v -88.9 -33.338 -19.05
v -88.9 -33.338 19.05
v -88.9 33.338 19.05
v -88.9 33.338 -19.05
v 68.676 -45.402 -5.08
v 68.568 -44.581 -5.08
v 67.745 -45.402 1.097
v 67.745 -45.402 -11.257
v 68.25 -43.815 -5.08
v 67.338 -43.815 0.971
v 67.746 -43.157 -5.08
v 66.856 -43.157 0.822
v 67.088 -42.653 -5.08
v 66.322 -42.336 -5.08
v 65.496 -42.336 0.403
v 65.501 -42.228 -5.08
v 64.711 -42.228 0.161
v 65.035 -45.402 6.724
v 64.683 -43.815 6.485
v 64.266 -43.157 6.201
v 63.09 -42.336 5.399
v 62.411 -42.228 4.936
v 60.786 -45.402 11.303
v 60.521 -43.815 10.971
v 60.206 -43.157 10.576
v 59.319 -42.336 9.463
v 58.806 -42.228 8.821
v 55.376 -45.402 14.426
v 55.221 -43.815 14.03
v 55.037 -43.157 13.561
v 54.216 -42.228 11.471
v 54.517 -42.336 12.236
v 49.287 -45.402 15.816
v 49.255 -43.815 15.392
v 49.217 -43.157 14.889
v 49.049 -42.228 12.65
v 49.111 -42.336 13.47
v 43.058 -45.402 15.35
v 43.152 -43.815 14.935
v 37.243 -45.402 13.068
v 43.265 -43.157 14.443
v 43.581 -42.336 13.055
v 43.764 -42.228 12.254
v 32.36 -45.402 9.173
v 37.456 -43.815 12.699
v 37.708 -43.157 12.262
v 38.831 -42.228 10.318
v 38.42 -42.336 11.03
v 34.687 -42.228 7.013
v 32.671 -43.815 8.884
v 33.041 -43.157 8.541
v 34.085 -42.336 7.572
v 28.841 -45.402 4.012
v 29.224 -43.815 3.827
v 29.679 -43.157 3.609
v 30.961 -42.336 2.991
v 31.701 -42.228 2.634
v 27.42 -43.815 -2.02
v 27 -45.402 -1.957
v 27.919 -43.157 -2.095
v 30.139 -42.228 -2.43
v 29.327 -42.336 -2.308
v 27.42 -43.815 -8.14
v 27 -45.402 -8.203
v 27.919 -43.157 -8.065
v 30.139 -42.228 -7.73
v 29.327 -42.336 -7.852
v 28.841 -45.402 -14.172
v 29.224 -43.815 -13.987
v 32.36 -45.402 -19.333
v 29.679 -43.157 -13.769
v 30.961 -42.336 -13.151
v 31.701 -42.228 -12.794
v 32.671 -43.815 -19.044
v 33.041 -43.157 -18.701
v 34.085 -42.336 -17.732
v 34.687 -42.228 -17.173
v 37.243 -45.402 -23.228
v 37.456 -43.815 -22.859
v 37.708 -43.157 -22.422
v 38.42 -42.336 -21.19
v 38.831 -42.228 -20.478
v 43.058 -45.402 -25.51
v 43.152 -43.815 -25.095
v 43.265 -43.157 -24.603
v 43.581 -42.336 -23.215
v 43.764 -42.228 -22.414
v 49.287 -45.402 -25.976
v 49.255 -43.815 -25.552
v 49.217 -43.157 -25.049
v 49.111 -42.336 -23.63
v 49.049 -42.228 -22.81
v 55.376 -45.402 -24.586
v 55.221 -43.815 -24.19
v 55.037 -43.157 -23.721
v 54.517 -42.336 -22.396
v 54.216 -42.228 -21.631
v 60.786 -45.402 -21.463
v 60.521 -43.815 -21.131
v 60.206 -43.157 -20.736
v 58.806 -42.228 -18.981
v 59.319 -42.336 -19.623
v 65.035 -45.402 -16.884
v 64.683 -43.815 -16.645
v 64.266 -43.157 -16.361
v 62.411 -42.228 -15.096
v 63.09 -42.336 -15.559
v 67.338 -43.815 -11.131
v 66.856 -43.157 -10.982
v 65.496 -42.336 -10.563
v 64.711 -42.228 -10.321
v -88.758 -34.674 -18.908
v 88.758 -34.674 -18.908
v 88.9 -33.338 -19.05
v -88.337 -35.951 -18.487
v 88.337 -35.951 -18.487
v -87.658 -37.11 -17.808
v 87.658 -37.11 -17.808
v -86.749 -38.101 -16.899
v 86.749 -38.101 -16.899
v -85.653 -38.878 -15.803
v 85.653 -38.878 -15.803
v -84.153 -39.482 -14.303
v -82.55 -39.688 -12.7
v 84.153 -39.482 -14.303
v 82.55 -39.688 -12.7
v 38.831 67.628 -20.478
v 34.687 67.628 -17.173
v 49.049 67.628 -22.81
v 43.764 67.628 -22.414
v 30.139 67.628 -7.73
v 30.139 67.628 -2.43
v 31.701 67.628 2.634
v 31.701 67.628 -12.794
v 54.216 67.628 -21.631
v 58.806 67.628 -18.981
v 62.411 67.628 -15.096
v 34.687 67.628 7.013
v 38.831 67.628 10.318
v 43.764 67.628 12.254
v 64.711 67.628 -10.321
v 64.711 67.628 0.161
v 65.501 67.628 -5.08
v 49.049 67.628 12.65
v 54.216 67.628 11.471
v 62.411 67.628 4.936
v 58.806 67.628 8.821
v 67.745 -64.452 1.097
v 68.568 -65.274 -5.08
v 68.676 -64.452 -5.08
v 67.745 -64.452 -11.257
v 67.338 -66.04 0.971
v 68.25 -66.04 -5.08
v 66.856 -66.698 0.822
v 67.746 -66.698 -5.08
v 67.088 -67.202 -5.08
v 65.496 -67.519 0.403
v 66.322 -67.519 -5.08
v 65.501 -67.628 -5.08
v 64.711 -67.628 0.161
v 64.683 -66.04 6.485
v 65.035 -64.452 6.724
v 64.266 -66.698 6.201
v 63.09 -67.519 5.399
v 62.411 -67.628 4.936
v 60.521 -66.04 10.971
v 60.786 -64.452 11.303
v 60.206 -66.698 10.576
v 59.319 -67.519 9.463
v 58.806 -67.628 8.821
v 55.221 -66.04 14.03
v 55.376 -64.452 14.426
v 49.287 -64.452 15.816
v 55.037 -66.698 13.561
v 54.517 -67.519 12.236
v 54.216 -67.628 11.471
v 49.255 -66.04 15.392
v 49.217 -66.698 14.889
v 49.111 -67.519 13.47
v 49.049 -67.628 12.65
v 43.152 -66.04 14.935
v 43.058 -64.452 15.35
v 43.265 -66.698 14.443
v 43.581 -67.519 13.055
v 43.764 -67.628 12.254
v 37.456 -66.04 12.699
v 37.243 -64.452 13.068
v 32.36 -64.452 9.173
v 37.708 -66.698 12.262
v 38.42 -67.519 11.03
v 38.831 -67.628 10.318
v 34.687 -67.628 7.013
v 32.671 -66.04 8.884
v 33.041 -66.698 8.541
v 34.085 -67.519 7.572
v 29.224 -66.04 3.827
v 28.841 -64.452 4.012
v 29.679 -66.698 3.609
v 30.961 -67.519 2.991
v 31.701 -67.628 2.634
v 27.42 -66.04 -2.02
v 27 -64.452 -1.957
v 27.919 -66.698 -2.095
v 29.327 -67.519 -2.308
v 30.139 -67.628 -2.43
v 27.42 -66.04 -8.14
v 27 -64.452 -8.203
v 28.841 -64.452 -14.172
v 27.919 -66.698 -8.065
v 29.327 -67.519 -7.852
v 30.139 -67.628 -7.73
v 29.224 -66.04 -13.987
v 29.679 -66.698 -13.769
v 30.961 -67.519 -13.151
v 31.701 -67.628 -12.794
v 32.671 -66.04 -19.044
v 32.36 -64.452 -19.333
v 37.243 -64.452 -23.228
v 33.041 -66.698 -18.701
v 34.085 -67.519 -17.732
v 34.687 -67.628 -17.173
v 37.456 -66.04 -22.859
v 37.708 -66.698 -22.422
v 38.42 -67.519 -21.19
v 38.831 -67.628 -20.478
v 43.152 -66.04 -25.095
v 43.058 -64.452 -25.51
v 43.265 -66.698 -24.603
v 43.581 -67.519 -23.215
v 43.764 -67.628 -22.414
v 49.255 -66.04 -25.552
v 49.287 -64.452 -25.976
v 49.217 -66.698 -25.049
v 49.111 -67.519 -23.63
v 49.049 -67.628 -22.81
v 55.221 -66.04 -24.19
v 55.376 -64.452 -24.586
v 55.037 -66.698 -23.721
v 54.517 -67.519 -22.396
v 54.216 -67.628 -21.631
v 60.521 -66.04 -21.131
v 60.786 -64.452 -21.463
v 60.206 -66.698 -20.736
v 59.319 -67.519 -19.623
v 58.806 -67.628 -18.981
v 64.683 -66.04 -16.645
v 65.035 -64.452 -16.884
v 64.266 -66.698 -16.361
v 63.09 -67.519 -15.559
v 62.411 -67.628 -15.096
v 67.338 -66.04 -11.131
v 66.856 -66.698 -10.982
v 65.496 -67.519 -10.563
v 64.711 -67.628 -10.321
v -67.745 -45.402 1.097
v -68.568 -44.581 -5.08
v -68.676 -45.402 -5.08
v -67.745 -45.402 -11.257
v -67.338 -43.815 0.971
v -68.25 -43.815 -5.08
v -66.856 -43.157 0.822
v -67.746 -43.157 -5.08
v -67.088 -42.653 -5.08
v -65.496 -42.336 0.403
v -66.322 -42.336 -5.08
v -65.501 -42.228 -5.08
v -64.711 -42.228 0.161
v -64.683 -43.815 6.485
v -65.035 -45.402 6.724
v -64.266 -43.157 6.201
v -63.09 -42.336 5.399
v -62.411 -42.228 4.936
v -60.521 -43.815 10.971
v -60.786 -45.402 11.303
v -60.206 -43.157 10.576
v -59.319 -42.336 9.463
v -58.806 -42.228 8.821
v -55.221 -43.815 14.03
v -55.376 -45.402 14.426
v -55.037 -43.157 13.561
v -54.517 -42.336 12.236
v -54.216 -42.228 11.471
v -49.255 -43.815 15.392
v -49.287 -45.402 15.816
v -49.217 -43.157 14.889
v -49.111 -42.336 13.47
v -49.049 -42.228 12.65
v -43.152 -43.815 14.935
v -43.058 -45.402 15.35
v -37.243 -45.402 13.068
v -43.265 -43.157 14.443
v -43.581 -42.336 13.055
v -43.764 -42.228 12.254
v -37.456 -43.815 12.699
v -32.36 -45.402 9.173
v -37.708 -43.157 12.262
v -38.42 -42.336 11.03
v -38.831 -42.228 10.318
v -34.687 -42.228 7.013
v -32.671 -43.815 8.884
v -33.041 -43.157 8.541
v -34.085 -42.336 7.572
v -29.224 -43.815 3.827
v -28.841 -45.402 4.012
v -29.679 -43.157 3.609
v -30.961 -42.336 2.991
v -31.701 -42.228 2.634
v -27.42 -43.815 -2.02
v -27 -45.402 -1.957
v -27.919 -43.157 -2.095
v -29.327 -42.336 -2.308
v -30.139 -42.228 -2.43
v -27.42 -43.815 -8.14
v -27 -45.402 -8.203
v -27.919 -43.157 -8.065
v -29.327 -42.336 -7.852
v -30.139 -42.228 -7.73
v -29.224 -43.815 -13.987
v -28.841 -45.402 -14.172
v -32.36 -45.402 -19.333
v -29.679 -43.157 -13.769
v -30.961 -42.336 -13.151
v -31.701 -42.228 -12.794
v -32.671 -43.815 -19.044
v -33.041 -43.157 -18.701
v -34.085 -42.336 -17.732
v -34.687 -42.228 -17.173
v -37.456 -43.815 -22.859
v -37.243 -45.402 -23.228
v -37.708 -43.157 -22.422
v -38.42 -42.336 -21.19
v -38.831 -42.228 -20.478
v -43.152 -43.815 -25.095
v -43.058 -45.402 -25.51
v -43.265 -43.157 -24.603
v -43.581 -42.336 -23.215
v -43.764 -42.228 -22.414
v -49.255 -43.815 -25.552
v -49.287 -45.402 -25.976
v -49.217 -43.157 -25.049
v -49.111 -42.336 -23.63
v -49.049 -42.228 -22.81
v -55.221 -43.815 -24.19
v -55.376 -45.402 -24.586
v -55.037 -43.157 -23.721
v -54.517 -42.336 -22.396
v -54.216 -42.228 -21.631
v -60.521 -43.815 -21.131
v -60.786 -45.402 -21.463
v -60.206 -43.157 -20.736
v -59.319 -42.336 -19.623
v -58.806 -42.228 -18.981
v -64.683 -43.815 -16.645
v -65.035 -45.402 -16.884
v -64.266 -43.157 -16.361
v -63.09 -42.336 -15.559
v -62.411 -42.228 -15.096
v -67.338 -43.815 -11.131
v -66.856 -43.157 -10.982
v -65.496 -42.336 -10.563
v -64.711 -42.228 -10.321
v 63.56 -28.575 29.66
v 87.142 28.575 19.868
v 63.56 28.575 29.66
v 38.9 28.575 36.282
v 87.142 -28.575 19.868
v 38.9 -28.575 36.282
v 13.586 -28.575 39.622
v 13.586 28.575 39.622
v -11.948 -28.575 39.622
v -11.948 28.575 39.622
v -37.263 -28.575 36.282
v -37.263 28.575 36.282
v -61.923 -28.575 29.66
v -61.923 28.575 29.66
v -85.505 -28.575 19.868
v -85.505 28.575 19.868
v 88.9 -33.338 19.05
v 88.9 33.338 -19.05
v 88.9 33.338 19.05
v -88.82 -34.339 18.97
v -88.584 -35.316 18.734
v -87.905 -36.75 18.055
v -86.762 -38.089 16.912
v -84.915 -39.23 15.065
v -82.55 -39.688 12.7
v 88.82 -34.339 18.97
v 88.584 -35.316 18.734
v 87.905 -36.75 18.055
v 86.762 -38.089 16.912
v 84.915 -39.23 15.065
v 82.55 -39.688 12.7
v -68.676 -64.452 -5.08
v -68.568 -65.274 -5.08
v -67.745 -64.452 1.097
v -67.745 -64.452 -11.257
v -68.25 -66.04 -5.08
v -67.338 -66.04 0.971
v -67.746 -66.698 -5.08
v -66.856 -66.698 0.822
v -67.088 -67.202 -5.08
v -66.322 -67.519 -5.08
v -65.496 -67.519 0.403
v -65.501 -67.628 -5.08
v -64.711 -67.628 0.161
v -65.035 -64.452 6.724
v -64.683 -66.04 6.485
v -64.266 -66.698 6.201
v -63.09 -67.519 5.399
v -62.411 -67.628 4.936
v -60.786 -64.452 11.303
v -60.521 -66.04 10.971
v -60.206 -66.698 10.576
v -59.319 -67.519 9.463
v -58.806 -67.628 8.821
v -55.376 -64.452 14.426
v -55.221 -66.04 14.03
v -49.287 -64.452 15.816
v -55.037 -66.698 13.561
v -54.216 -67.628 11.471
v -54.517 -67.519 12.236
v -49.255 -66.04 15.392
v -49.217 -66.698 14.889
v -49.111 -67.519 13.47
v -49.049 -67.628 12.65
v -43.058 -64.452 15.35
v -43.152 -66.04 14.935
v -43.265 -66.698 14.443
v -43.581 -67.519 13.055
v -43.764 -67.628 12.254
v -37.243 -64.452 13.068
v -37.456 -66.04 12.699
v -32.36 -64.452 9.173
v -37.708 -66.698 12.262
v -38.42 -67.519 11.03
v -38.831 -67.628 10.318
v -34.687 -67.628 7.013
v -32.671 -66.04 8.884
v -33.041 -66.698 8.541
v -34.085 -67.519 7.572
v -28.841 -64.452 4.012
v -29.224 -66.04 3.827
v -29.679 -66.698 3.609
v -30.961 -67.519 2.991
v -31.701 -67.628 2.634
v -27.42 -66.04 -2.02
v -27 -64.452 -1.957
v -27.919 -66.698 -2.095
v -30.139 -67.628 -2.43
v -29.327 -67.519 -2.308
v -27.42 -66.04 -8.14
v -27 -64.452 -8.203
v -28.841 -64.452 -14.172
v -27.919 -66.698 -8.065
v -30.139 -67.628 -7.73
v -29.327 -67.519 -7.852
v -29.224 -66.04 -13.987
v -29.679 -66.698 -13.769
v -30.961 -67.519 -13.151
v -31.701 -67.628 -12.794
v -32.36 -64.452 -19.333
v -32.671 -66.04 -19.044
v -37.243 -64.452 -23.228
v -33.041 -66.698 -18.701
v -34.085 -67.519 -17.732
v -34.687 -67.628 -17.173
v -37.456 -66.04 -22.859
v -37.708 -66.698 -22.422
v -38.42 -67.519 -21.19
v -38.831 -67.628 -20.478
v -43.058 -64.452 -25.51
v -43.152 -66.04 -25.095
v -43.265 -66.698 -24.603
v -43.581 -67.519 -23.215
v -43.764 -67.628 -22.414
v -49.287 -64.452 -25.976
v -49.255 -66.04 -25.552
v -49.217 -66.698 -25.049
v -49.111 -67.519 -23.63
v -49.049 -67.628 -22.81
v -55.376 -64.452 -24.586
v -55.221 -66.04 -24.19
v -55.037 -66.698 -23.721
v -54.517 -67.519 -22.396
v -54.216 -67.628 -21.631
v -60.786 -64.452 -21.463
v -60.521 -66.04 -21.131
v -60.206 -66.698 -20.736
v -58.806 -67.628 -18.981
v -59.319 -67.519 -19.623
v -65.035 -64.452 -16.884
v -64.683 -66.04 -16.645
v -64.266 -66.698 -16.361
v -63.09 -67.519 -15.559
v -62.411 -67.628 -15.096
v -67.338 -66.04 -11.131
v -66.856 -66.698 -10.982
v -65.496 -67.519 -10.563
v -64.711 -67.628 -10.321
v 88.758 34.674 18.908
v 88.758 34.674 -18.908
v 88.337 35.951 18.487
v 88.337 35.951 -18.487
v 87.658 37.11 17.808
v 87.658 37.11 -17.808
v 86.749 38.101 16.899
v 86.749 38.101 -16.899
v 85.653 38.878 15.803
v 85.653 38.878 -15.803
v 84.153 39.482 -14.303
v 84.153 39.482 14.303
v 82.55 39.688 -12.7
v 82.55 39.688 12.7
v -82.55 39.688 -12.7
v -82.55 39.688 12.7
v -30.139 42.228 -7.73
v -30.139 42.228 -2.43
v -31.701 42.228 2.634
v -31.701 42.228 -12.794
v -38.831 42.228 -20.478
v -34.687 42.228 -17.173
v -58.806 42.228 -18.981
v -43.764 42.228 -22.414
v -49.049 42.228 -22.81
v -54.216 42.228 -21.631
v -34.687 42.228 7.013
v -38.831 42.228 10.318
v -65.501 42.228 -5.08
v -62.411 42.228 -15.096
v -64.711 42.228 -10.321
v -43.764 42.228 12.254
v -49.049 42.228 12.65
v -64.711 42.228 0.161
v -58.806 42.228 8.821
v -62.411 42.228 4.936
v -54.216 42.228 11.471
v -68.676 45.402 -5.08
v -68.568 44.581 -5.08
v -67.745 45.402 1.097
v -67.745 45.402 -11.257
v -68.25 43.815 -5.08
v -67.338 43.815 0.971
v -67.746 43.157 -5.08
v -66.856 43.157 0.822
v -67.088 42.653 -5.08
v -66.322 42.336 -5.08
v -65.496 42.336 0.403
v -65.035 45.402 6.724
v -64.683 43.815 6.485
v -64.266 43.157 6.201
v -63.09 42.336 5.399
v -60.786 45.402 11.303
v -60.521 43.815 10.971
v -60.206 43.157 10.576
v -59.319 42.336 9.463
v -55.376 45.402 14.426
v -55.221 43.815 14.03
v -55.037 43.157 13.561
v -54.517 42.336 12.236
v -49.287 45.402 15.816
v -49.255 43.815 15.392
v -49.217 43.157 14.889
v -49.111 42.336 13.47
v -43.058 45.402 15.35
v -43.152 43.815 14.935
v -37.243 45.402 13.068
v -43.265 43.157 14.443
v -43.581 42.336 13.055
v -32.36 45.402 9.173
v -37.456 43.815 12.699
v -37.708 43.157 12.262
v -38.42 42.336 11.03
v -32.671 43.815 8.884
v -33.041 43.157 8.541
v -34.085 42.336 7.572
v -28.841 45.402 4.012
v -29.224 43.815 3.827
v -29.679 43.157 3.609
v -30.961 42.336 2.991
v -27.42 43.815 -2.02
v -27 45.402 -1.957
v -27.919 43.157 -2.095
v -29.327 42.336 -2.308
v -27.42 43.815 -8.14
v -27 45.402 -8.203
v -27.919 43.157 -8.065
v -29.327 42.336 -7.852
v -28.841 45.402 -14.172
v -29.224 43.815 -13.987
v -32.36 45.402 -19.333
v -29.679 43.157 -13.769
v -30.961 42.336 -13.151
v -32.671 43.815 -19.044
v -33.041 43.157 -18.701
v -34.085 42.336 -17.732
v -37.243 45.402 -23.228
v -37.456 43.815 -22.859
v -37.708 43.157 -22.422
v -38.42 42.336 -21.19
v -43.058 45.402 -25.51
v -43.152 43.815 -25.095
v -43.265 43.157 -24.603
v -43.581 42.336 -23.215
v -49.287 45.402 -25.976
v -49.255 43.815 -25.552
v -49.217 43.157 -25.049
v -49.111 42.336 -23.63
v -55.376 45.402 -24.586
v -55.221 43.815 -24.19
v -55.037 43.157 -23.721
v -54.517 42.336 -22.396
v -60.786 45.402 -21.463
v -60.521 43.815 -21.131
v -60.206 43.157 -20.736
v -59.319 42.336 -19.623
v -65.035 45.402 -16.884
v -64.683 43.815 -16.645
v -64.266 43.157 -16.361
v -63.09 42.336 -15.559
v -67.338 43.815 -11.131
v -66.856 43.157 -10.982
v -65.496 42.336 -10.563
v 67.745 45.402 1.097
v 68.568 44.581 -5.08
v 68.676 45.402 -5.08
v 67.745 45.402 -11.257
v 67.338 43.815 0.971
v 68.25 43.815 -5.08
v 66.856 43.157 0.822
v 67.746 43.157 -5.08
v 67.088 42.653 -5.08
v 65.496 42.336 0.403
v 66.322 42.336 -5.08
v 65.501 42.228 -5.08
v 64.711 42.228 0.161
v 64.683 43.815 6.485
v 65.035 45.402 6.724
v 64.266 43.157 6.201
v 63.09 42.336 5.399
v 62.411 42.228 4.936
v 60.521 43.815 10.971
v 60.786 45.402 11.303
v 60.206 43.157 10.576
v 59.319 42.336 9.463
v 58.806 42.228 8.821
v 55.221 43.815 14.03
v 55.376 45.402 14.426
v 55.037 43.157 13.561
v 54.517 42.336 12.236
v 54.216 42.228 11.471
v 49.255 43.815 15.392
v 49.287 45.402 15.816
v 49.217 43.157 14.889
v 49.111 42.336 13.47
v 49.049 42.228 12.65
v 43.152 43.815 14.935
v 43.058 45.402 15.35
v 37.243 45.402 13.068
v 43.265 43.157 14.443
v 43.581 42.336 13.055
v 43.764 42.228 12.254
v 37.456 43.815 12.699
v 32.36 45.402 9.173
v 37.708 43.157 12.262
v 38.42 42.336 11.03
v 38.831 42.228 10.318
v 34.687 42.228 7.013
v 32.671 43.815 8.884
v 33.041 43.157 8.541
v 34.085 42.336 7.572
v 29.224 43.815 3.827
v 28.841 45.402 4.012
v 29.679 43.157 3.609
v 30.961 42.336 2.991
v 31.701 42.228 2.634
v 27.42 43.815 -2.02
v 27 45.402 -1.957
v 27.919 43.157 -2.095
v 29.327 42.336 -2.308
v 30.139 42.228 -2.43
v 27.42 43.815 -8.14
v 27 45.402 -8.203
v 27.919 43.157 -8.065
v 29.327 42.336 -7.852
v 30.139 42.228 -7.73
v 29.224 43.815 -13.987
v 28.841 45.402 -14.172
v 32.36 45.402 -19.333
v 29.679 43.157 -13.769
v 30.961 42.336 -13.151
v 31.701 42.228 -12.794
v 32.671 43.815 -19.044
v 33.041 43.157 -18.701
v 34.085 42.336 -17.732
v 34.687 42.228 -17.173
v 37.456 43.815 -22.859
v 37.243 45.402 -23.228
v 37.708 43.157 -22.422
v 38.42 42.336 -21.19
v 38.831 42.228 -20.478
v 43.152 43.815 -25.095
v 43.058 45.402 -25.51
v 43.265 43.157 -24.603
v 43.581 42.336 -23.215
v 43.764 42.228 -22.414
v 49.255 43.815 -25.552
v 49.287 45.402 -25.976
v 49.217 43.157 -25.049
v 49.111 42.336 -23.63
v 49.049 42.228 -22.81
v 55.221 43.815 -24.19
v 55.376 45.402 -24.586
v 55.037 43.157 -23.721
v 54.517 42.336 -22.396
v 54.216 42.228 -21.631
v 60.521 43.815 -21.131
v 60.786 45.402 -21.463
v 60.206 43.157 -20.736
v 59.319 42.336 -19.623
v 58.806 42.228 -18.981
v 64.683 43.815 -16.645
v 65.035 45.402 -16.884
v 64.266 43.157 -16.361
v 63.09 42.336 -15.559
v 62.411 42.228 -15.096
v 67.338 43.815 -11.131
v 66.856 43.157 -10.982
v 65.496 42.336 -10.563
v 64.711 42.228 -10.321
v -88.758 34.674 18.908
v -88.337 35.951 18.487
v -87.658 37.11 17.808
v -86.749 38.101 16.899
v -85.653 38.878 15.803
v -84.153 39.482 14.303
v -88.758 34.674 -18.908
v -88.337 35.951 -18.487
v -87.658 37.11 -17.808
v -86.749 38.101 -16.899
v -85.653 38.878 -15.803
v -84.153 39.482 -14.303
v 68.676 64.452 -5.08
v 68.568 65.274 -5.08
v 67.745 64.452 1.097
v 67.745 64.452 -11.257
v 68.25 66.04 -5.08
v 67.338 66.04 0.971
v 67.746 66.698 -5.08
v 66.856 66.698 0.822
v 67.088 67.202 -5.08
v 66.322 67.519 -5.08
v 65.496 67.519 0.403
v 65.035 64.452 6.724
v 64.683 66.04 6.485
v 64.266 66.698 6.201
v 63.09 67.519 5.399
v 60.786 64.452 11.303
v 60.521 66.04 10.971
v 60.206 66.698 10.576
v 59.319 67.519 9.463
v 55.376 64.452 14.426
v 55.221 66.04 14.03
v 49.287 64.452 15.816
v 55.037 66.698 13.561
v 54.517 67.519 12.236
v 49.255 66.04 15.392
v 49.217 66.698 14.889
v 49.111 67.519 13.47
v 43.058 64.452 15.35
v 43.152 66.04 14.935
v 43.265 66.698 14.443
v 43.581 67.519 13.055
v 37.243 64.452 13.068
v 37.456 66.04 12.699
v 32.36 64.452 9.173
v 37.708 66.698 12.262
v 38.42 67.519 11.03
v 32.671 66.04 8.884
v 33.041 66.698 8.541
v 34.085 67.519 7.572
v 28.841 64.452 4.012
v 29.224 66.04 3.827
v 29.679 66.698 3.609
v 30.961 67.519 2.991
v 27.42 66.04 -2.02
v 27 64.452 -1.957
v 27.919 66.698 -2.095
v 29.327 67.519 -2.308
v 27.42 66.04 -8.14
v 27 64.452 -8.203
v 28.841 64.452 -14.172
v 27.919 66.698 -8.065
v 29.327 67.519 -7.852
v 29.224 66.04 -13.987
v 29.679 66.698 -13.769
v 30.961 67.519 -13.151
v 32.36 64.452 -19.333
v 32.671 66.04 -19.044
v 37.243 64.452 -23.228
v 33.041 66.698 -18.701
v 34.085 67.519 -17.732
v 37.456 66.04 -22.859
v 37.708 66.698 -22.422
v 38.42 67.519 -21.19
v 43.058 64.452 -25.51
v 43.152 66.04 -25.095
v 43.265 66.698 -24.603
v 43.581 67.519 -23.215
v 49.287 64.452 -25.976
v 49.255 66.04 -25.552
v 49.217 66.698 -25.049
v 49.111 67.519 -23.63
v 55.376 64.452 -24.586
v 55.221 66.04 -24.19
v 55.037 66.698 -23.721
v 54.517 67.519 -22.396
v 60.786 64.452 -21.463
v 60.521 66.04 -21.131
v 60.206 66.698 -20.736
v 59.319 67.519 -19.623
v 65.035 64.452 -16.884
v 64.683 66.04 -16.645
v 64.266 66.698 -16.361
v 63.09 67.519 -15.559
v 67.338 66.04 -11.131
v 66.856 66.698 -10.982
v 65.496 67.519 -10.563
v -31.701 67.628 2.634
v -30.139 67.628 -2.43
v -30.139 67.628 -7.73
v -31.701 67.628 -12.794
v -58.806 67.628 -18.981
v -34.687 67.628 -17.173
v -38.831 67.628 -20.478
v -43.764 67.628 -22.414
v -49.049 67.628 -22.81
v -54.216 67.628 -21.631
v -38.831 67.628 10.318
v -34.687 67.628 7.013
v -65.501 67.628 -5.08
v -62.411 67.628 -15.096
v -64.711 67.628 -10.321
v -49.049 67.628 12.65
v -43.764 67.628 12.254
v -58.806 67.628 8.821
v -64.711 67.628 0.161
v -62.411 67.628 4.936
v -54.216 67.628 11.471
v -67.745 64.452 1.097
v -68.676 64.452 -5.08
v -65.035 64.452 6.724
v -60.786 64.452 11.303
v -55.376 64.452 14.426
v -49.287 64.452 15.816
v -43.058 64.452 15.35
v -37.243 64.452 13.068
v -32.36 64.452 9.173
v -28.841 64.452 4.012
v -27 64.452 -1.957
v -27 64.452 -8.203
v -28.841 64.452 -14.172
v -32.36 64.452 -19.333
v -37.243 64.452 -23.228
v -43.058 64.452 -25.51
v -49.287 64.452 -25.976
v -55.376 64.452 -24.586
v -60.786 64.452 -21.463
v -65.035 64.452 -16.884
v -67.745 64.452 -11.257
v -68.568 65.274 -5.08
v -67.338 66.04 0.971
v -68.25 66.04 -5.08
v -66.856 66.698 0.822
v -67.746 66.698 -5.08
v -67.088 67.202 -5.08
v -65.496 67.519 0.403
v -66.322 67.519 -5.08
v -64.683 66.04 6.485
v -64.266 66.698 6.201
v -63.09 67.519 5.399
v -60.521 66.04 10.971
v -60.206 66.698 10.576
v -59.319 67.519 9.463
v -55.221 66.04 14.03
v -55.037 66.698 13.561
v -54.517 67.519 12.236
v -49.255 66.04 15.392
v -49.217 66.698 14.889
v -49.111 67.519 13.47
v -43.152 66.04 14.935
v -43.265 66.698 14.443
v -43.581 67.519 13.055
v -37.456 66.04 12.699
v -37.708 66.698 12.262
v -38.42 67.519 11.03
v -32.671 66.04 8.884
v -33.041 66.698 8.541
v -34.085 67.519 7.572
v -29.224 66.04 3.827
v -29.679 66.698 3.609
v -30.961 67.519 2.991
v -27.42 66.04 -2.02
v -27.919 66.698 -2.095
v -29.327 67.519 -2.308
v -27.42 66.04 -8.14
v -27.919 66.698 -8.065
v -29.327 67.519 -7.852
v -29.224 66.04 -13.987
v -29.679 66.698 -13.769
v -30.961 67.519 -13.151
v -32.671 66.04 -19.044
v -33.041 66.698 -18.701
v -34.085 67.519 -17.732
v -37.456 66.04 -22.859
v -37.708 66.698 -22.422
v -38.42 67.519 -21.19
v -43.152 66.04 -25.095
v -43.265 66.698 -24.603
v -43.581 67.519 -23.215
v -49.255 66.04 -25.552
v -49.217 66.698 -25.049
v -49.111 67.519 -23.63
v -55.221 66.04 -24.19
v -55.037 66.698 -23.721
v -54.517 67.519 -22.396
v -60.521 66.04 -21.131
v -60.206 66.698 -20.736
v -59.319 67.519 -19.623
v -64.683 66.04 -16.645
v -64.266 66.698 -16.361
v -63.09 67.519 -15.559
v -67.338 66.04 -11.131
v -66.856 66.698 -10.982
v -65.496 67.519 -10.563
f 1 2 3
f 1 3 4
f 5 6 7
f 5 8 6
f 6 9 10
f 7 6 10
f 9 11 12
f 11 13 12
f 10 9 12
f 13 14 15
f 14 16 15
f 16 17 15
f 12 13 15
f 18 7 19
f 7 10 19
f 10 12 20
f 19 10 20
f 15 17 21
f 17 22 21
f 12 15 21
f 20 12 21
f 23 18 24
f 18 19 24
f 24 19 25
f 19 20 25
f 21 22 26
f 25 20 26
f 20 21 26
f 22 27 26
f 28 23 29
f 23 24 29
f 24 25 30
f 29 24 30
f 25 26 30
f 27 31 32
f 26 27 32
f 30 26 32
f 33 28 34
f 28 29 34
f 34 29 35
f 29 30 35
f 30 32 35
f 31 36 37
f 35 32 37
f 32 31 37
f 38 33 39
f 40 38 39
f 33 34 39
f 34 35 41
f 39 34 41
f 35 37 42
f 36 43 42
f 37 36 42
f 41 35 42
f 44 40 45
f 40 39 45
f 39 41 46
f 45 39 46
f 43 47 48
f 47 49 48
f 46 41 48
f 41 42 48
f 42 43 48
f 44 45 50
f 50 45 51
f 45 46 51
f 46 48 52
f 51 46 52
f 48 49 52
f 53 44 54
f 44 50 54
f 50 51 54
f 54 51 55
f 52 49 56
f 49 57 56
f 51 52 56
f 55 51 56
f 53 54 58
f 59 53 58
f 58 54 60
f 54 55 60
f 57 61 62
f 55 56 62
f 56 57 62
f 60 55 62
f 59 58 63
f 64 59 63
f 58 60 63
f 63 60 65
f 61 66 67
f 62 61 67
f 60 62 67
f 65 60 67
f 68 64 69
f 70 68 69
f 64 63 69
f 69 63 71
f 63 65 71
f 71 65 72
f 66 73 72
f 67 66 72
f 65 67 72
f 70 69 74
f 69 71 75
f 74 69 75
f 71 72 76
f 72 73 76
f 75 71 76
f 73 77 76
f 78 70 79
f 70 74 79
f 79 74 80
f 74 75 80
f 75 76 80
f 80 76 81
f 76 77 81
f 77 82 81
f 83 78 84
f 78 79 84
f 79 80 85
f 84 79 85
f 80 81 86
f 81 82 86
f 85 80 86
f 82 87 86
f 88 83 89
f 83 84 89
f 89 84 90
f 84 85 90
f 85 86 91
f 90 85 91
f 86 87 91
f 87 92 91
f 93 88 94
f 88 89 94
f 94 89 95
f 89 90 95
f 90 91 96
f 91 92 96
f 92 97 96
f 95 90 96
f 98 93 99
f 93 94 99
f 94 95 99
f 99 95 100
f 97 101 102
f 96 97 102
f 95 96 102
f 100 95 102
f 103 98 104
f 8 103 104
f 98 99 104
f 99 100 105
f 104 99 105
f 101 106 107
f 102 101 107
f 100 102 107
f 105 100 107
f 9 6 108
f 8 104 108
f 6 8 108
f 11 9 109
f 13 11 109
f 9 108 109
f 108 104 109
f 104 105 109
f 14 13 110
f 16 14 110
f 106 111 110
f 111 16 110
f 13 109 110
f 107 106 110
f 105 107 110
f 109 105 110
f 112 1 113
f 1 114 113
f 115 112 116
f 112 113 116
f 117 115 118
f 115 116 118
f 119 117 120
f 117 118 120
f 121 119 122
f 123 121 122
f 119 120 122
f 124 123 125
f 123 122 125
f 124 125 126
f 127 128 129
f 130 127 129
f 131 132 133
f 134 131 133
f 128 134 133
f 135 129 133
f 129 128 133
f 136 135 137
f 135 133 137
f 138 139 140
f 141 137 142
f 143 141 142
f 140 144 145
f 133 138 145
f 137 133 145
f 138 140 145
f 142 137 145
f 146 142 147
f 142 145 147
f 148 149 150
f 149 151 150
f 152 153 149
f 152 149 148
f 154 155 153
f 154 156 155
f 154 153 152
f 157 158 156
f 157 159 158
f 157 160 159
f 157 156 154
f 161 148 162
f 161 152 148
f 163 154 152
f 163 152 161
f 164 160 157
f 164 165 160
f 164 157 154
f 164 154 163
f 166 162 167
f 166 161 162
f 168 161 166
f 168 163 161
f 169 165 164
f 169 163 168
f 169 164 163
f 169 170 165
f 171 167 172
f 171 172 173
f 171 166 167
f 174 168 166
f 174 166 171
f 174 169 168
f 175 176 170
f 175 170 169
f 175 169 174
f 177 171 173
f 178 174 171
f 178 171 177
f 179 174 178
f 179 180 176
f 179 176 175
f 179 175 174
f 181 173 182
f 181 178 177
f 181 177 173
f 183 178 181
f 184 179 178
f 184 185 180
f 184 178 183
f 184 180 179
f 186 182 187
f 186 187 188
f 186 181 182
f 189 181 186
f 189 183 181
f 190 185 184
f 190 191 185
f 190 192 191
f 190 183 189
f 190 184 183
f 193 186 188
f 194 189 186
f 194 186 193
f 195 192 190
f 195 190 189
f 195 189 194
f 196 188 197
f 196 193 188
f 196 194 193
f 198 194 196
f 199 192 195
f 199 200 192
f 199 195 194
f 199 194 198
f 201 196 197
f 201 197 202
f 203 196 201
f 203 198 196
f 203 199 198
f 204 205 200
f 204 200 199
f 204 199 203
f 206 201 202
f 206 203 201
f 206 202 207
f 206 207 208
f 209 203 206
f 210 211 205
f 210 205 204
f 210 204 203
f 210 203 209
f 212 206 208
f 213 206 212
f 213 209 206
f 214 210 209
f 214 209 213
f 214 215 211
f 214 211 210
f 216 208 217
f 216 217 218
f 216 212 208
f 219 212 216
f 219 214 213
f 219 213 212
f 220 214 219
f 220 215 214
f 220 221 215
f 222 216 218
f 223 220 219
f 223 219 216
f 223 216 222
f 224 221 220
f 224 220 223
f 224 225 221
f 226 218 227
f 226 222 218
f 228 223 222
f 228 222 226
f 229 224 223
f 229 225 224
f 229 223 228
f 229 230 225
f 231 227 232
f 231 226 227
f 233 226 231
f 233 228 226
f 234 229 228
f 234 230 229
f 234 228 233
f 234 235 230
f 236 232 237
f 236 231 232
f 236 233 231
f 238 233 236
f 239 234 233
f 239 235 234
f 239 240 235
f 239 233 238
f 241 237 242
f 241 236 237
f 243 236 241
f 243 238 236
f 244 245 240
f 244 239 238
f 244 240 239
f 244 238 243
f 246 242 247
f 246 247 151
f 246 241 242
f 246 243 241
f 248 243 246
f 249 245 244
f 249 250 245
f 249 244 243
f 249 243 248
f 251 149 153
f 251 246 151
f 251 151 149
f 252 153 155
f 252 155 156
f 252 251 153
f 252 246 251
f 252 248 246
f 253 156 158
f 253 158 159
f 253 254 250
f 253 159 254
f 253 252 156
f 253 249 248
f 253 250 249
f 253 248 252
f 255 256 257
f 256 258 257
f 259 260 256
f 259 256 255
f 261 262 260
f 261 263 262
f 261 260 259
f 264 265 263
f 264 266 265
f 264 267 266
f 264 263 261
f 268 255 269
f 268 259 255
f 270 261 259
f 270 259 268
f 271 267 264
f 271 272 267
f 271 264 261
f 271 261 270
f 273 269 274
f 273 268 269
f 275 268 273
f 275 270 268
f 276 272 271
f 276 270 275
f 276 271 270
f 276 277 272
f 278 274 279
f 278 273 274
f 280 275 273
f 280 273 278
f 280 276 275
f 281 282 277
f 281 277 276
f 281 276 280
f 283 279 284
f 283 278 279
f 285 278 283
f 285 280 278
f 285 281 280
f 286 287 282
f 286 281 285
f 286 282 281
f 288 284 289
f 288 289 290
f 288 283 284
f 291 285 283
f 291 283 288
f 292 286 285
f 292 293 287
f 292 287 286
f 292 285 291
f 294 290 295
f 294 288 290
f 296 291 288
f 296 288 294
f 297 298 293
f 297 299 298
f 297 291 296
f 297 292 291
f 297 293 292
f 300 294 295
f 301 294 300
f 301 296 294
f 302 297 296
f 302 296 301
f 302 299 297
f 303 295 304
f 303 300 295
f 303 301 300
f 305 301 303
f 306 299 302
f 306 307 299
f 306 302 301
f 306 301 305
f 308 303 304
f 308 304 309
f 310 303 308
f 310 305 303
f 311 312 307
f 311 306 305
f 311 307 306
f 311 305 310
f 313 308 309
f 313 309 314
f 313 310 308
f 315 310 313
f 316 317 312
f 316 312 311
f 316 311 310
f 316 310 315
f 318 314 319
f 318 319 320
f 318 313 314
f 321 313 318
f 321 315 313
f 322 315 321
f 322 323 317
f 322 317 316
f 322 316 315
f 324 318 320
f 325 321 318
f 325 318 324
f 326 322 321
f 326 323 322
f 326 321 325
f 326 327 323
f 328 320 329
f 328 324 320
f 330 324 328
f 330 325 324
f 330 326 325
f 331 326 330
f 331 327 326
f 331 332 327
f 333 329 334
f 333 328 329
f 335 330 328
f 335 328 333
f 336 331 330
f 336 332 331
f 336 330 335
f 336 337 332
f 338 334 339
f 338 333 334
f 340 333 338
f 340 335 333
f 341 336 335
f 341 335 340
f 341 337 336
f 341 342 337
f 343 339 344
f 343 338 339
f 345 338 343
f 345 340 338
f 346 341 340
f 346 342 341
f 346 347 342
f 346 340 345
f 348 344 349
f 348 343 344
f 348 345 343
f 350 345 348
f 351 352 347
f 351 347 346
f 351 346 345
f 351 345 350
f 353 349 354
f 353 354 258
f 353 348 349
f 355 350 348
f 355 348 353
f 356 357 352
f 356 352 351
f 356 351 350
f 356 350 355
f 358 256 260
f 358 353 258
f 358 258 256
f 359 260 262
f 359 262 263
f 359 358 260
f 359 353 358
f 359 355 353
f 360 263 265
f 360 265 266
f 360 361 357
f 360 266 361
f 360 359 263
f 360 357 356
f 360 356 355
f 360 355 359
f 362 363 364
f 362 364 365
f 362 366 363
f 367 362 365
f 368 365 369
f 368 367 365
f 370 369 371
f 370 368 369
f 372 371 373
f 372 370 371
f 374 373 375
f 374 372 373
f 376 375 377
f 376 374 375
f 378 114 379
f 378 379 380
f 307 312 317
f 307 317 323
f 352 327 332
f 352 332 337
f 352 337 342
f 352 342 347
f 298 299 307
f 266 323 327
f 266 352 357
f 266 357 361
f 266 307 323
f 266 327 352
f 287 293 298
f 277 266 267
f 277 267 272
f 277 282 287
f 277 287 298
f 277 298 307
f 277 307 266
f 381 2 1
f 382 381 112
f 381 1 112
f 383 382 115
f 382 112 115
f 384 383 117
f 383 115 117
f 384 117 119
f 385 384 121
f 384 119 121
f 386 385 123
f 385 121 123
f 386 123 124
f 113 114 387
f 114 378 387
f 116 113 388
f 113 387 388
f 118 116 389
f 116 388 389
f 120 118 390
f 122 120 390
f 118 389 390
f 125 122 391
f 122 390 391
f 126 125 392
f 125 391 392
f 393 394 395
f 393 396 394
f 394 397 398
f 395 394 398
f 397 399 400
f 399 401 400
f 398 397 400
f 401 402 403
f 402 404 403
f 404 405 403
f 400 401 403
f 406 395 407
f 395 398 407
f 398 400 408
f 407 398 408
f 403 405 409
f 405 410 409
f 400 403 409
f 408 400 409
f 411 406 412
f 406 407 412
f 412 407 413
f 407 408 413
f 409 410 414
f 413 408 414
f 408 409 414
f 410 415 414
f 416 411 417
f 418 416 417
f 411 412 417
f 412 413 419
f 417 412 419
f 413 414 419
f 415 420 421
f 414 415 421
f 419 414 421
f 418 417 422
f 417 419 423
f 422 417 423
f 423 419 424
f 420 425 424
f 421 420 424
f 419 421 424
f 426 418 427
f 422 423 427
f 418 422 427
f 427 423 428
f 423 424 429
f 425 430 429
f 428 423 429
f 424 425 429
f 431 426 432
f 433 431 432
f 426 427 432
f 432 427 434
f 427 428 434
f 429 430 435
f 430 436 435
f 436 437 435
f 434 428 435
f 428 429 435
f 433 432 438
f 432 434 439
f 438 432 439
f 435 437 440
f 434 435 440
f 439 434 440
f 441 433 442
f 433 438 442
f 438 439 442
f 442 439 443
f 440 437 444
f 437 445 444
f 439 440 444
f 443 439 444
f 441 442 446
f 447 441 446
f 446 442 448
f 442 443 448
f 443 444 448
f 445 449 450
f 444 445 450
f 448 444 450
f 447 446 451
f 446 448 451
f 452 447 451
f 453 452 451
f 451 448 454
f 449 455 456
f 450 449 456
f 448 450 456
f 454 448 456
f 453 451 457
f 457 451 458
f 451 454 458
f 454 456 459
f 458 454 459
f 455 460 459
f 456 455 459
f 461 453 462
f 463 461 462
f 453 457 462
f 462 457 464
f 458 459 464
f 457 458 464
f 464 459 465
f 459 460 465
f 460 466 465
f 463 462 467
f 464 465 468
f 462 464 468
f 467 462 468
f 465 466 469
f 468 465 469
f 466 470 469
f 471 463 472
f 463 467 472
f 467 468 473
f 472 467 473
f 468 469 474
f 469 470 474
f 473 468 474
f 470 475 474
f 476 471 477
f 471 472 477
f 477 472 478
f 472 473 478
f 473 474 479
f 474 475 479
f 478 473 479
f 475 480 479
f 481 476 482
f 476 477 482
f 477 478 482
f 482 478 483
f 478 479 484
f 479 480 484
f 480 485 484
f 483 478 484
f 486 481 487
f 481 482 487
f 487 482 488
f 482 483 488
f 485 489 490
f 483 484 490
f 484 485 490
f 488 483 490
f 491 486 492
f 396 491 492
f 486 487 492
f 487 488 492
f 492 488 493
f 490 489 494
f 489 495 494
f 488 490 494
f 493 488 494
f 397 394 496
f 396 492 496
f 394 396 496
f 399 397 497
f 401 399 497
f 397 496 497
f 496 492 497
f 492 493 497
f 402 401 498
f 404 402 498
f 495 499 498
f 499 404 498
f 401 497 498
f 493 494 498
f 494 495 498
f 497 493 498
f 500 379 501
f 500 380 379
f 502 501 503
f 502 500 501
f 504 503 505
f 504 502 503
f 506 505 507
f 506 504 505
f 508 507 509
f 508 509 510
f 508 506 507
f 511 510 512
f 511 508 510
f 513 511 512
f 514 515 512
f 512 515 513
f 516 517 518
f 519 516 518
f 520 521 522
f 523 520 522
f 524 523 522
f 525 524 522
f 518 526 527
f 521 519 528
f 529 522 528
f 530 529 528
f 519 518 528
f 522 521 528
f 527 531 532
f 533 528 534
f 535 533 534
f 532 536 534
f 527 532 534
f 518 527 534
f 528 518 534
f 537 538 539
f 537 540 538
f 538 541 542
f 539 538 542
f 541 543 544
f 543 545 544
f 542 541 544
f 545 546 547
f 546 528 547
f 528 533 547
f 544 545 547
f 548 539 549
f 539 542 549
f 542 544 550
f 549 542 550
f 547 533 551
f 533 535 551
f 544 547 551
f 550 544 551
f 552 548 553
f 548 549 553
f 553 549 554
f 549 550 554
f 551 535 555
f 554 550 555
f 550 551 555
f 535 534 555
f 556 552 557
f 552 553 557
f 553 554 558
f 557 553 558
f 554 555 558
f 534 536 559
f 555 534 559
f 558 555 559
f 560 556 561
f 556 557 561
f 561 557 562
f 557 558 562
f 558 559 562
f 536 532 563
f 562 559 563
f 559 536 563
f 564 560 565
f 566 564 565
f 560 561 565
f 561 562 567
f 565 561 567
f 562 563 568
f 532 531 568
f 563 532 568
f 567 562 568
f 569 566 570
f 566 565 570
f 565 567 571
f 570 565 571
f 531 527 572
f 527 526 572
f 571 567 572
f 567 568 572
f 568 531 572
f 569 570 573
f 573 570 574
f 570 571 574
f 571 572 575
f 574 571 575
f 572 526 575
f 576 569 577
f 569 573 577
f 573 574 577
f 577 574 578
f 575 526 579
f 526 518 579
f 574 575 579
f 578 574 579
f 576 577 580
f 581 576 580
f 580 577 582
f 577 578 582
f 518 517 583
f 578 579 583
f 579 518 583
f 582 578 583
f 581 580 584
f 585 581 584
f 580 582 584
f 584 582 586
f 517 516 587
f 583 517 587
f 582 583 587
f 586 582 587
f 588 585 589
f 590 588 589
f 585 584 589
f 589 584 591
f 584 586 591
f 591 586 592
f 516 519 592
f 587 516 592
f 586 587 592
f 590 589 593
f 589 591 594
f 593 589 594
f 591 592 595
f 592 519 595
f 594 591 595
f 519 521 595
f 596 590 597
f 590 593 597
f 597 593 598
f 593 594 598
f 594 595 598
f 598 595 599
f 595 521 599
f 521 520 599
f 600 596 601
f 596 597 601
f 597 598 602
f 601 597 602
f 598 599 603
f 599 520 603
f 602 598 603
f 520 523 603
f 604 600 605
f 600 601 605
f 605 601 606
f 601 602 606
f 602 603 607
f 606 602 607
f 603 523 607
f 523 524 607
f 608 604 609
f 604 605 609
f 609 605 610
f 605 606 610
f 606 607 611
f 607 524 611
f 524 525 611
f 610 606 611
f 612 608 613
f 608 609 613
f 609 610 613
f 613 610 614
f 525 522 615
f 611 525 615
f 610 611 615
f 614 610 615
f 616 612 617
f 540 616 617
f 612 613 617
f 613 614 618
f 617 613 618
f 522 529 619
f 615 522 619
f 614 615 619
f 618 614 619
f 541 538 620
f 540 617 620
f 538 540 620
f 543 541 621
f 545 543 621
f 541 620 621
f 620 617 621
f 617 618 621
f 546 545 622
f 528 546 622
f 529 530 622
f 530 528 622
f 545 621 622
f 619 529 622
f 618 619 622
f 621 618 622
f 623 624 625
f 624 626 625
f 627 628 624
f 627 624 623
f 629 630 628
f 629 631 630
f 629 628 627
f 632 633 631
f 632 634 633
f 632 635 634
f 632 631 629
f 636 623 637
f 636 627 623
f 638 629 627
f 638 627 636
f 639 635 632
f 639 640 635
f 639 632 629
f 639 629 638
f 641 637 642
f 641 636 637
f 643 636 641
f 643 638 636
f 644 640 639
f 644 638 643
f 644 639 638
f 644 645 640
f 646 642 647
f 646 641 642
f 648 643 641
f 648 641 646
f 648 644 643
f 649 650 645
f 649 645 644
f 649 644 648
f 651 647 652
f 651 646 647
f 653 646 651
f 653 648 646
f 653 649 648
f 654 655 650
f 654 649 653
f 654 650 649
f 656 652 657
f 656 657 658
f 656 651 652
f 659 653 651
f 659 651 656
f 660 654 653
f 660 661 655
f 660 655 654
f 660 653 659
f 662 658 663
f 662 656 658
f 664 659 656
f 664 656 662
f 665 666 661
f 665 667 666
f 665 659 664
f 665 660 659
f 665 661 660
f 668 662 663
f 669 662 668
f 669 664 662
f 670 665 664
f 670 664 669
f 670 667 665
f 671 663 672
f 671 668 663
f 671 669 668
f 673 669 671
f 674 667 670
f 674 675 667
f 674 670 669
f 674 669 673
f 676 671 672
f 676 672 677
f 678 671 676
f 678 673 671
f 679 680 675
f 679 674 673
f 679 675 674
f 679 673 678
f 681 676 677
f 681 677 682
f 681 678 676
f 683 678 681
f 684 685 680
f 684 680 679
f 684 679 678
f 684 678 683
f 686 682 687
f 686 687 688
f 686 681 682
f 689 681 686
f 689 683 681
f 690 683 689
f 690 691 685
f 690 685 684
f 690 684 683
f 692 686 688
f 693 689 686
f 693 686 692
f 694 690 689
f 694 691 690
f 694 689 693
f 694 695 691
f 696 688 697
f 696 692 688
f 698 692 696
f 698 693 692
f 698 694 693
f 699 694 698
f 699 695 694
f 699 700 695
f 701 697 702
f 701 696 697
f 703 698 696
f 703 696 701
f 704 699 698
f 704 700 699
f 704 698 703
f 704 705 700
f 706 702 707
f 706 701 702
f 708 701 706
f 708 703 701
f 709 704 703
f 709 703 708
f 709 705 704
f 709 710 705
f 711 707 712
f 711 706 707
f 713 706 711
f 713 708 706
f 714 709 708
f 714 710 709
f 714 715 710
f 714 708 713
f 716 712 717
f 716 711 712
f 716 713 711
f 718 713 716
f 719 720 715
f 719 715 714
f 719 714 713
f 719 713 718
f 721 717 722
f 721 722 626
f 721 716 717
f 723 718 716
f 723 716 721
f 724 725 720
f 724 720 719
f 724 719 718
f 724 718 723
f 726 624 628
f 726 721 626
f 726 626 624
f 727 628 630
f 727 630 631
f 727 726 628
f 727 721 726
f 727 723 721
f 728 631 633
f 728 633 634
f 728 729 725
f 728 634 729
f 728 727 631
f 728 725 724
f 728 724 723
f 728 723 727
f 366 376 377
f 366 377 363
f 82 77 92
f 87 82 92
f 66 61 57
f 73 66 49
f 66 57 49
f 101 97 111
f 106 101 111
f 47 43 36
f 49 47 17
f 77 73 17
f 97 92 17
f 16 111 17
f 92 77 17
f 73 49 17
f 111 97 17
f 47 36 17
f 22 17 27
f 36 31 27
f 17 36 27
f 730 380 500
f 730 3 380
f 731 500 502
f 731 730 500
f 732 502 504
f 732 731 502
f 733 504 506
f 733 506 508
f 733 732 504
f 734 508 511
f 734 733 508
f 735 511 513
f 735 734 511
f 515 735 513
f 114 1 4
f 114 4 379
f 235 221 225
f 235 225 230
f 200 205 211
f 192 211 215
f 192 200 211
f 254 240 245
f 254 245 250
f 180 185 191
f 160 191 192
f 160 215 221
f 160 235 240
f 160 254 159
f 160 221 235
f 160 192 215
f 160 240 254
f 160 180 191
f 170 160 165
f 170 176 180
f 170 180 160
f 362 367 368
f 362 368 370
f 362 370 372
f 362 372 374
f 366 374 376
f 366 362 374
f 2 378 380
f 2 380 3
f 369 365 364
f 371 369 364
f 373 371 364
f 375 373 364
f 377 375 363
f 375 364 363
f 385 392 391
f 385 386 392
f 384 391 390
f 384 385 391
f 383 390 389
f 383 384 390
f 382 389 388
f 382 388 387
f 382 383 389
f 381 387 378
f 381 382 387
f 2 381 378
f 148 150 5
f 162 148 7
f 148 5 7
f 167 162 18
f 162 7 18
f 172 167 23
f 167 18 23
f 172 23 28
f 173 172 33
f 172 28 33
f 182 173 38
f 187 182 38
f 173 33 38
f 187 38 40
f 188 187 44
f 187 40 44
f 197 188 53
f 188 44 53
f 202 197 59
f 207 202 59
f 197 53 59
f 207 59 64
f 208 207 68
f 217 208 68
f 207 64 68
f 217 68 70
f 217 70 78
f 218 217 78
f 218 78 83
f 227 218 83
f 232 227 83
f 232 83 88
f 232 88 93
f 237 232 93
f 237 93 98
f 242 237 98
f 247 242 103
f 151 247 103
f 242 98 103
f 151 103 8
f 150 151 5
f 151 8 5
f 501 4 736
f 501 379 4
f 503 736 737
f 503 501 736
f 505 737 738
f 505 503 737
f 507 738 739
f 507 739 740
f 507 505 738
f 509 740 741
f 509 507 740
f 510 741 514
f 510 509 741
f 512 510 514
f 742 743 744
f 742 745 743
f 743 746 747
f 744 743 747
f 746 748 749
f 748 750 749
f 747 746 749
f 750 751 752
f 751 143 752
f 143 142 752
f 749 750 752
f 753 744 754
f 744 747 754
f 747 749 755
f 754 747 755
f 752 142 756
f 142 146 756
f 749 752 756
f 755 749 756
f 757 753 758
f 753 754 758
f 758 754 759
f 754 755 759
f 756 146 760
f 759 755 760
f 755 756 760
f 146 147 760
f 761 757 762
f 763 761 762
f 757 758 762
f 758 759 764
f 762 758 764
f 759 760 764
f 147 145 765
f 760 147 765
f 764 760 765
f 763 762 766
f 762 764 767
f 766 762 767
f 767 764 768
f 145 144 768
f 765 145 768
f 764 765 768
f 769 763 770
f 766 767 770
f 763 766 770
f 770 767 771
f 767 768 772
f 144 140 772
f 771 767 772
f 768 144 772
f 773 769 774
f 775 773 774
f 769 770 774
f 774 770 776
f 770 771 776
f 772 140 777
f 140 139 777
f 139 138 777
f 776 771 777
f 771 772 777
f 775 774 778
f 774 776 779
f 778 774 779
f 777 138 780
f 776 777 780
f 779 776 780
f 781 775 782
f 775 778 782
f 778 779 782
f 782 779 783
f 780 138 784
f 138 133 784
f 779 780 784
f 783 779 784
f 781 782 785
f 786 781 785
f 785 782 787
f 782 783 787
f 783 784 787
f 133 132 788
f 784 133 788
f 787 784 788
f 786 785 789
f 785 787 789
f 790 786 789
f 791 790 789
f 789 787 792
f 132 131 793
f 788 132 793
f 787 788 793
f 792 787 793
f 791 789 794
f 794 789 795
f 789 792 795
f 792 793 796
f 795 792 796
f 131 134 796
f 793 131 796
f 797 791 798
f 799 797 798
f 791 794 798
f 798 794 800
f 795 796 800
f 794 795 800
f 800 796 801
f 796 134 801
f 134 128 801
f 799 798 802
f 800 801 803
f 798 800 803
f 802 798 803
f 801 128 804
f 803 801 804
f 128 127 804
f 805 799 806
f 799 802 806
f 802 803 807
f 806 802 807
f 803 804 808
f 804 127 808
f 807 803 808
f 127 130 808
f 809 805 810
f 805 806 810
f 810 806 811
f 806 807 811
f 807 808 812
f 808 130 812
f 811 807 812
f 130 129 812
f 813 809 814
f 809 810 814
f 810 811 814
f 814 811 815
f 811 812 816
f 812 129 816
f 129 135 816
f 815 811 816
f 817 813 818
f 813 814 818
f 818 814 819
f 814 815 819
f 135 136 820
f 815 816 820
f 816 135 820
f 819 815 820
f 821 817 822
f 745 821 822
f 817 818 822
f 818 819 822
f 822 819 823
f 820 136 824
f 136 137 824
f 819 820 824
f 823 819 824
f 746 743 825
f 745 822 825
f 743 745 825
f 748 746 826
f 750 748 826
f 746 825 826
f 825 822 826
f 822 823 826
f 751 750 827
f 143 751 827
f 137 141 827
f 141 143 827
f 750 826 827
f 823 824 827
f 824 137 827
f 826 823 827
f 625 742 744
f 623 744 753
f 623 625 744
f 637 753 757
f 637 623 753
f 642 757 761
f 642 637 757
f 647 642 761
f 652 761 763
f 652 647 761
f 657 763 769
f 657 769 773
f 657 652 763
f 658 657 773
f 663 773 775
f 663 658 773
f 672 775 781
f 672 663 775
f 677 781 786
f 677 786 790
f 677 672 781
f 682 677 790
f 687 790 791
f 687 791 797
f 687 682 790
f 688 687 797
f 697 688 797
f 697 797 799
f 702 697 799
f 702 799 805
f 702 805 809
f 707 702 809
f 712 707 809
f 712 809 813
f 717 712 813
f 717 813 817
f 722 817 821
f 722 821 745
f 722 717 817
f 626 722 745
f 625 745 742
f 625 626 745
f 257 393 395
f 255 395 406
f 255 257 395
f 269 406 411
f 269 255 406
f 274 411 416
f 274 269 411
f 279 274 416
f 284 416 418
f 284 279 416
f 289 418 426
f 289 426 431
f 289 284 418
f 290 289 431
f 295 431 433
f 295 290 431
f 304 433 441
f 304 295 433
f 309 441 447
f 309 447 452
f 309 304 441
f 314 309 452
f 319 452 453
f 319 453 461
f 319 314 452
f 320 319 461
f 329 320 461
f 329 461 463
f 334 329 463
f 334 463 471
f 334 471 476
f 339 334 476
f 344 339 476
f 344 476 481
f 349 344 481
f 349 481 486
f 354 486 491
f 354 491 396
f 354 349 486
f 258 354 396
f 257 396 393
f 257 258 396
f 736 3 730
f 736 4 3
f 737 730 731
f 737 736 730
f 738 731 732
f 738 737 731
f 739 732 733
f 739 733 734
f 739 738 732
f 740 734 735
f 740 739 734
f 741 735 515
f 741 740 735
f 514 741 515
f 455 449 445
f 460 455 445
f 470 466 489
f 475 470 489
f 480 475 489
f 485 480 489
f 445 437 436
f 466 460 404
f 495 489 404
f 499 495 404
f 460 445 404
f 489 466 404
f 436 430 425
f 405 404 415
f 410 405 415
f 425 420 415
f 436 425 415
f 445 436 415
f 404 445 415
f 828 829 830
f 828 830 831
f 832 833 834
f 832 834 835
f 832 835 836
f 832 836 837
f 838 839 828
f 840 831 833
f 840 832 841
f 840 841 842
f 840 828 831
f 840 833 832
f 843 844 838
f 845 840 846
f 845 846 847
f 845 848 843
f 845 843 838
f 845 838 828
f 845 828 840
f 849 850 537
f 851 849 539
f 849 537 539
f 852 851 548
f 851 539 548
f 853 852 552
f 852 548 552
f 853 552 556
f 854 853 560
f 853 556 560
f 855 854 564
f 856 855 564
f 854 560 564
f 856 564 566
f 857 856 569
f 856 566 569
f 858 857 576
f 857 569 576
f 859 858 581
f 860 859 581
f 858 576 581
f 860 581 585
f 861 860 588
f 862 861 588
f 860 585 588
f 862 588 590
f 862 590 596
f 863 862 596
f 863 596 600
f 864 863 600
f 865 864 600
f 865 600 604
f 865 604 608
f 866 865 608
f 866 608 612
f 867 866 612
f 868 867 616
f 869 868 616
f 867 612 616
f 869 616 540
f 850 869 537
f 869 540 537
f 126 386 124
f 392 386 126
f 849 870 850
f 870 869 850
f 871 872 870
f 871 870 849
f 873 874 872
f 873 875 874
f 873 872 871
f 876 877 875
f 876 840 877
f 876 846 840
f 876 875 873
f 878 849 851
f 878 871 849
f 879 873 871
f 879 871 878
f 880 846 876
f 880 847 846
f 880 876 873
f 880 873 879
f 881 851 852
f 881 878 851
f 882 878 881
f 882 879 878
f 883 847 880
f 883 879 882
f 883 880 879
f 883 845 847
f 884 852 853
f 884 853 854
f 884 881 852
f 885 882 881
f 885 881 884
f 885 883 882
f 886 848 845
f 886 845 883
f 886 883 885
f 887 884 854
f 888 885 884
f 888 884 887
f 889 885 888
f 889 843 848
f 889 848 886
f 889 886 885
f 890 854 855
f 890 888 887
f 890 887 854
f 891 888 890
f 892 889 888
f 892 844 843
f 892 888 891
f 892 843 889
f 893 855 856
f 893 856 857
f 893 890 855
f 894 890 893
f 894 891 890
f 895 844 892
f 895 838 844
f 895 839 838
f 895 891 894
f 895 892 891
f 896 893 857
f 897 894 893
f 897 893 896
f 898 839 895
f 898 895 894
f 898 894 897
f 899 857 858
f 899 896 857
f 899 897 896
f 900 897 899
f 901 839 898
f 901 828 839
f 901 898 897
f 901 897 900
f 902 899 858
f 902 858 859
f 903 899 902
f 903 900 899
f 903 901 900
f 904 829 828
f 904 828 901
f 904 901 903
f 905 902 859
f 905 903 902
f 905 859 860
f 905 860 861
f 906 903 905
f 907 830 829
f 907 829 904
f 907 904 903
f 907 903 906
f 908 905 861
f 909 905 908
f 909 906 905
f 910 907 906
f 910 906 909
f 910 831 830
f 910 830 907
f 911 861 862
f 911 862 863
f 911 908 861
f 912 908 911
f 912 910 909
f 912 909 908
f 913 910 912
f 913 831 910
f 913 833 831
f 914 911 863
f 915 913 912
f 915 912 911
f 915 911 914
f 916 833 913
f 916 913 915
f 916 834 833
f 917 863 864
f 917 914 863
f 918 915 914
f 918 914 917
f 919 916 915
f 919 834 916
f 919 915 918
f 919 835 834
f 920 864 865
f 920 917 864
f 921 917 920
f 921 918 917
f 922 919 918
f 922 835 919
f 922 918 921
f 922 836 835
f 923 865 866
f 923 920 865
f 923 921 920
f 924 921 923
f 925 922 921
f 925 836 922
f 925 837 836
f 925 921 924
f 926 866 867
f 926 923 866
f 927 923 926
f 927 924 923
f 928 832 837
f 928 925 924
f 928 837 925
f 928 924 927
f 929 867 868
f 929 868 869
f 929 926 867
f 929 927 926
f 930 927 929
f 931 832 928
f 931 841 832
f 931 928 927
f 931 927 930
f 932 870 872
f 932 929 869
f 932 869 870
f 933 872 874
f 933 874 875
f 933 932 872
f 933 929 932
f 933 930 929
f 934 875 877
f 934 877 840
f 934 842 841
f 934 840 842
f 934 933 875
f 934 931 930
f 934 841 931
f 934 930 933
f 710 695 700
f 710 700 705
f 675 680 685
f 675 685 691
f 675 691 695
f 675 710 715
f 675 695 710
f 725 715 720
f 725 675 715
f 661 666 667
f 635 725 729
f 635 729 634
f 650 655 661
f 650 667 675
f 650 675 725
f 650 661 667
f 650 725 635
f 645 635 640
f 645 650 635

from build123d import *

# Parameters (mm, degrees)
F2_DEPTH  = 39.6875
F4_R      = 20.955
F5_DEPTH  = 25.4
F6_R      = 6.35
F7_R      = 3.175
F11_DEPTH = 28.575


with BuildPart() as f2:
    # F0 (on Front) → F2 (new body, symmetric)
    with BuildSketch(Plane.XZ):
        Polygon((59.189826, -19.05), (88.9, -19.05), (88.9, 19.05), (-88.9, 19.05), (-88.9, -19.05), align=None)
    extrude(amount=F2_DEPTH, both=True)

    # F6
    f6_edges = [f2.edges().sort_by_distance(p)[0] for p in [
        (0, -39.6875, 19.05),
        (0, -39.6875, -19.05),
        (-88.9, -39.6875, 0),
        (88.9, -39.6875, 0),
        (88.9, 39.6875, 0),
        (0, 39.6875, 19.05),
        (-88.9, 39.6875, 0),
        (0, 39.6875, -19.05),
    ]]
    fillet(f6_edges, radius=F6_R)


with BuildPart() as f5:
    # F4 (on offset) → F5 (new body)
    with BuildSketch(Plane.XZ.offset(42.2275)):
        with Locations((47.720712, -5.08)):
            Circle(F4_R)
    extrude(amount=F5_DEPTH)

    # F7
    f7_edges = [f5.edges().sort_by_distance(p)[0] for p in [
        (26.765712, -67.6275, -5.08),
        (26.765712, -42.2275, -5.08),
    ]]
    fillet(f7_edges, radius=F7_R)


with BuildPart() as f8_1:
    # F8: instance of F5
    add(f5.part.mirror(Plane.XZ))


with BuildPart() as f9_1:
    # F9: instance of F5
    add(f5.part.mirror(Plane.YZ))


with BuildPart() as f9_2:
    # F9: instance of F8_1
    add(f8_1.part.mirror(Plane.YZ))


with BuildPart() as f11:
    # F10 (on Front) → F11 (new body, symmetric)
    with BuildSketch(Plane.XZ):
        with BuildLine():
            ThreePointArc((87.142169, 19.868158), (0.818769, 40.041205), (-85.504632, 19.868158))
            Line((-85.504632, 19.868158), (87.142169, 19.868158))
        make_face()
    extrude(amount=F11_DEPTH, both=True)


solid = Compound([f2.part, f5.part, f8_1.part, f9_1.part, f9_2.part, f11.part])
